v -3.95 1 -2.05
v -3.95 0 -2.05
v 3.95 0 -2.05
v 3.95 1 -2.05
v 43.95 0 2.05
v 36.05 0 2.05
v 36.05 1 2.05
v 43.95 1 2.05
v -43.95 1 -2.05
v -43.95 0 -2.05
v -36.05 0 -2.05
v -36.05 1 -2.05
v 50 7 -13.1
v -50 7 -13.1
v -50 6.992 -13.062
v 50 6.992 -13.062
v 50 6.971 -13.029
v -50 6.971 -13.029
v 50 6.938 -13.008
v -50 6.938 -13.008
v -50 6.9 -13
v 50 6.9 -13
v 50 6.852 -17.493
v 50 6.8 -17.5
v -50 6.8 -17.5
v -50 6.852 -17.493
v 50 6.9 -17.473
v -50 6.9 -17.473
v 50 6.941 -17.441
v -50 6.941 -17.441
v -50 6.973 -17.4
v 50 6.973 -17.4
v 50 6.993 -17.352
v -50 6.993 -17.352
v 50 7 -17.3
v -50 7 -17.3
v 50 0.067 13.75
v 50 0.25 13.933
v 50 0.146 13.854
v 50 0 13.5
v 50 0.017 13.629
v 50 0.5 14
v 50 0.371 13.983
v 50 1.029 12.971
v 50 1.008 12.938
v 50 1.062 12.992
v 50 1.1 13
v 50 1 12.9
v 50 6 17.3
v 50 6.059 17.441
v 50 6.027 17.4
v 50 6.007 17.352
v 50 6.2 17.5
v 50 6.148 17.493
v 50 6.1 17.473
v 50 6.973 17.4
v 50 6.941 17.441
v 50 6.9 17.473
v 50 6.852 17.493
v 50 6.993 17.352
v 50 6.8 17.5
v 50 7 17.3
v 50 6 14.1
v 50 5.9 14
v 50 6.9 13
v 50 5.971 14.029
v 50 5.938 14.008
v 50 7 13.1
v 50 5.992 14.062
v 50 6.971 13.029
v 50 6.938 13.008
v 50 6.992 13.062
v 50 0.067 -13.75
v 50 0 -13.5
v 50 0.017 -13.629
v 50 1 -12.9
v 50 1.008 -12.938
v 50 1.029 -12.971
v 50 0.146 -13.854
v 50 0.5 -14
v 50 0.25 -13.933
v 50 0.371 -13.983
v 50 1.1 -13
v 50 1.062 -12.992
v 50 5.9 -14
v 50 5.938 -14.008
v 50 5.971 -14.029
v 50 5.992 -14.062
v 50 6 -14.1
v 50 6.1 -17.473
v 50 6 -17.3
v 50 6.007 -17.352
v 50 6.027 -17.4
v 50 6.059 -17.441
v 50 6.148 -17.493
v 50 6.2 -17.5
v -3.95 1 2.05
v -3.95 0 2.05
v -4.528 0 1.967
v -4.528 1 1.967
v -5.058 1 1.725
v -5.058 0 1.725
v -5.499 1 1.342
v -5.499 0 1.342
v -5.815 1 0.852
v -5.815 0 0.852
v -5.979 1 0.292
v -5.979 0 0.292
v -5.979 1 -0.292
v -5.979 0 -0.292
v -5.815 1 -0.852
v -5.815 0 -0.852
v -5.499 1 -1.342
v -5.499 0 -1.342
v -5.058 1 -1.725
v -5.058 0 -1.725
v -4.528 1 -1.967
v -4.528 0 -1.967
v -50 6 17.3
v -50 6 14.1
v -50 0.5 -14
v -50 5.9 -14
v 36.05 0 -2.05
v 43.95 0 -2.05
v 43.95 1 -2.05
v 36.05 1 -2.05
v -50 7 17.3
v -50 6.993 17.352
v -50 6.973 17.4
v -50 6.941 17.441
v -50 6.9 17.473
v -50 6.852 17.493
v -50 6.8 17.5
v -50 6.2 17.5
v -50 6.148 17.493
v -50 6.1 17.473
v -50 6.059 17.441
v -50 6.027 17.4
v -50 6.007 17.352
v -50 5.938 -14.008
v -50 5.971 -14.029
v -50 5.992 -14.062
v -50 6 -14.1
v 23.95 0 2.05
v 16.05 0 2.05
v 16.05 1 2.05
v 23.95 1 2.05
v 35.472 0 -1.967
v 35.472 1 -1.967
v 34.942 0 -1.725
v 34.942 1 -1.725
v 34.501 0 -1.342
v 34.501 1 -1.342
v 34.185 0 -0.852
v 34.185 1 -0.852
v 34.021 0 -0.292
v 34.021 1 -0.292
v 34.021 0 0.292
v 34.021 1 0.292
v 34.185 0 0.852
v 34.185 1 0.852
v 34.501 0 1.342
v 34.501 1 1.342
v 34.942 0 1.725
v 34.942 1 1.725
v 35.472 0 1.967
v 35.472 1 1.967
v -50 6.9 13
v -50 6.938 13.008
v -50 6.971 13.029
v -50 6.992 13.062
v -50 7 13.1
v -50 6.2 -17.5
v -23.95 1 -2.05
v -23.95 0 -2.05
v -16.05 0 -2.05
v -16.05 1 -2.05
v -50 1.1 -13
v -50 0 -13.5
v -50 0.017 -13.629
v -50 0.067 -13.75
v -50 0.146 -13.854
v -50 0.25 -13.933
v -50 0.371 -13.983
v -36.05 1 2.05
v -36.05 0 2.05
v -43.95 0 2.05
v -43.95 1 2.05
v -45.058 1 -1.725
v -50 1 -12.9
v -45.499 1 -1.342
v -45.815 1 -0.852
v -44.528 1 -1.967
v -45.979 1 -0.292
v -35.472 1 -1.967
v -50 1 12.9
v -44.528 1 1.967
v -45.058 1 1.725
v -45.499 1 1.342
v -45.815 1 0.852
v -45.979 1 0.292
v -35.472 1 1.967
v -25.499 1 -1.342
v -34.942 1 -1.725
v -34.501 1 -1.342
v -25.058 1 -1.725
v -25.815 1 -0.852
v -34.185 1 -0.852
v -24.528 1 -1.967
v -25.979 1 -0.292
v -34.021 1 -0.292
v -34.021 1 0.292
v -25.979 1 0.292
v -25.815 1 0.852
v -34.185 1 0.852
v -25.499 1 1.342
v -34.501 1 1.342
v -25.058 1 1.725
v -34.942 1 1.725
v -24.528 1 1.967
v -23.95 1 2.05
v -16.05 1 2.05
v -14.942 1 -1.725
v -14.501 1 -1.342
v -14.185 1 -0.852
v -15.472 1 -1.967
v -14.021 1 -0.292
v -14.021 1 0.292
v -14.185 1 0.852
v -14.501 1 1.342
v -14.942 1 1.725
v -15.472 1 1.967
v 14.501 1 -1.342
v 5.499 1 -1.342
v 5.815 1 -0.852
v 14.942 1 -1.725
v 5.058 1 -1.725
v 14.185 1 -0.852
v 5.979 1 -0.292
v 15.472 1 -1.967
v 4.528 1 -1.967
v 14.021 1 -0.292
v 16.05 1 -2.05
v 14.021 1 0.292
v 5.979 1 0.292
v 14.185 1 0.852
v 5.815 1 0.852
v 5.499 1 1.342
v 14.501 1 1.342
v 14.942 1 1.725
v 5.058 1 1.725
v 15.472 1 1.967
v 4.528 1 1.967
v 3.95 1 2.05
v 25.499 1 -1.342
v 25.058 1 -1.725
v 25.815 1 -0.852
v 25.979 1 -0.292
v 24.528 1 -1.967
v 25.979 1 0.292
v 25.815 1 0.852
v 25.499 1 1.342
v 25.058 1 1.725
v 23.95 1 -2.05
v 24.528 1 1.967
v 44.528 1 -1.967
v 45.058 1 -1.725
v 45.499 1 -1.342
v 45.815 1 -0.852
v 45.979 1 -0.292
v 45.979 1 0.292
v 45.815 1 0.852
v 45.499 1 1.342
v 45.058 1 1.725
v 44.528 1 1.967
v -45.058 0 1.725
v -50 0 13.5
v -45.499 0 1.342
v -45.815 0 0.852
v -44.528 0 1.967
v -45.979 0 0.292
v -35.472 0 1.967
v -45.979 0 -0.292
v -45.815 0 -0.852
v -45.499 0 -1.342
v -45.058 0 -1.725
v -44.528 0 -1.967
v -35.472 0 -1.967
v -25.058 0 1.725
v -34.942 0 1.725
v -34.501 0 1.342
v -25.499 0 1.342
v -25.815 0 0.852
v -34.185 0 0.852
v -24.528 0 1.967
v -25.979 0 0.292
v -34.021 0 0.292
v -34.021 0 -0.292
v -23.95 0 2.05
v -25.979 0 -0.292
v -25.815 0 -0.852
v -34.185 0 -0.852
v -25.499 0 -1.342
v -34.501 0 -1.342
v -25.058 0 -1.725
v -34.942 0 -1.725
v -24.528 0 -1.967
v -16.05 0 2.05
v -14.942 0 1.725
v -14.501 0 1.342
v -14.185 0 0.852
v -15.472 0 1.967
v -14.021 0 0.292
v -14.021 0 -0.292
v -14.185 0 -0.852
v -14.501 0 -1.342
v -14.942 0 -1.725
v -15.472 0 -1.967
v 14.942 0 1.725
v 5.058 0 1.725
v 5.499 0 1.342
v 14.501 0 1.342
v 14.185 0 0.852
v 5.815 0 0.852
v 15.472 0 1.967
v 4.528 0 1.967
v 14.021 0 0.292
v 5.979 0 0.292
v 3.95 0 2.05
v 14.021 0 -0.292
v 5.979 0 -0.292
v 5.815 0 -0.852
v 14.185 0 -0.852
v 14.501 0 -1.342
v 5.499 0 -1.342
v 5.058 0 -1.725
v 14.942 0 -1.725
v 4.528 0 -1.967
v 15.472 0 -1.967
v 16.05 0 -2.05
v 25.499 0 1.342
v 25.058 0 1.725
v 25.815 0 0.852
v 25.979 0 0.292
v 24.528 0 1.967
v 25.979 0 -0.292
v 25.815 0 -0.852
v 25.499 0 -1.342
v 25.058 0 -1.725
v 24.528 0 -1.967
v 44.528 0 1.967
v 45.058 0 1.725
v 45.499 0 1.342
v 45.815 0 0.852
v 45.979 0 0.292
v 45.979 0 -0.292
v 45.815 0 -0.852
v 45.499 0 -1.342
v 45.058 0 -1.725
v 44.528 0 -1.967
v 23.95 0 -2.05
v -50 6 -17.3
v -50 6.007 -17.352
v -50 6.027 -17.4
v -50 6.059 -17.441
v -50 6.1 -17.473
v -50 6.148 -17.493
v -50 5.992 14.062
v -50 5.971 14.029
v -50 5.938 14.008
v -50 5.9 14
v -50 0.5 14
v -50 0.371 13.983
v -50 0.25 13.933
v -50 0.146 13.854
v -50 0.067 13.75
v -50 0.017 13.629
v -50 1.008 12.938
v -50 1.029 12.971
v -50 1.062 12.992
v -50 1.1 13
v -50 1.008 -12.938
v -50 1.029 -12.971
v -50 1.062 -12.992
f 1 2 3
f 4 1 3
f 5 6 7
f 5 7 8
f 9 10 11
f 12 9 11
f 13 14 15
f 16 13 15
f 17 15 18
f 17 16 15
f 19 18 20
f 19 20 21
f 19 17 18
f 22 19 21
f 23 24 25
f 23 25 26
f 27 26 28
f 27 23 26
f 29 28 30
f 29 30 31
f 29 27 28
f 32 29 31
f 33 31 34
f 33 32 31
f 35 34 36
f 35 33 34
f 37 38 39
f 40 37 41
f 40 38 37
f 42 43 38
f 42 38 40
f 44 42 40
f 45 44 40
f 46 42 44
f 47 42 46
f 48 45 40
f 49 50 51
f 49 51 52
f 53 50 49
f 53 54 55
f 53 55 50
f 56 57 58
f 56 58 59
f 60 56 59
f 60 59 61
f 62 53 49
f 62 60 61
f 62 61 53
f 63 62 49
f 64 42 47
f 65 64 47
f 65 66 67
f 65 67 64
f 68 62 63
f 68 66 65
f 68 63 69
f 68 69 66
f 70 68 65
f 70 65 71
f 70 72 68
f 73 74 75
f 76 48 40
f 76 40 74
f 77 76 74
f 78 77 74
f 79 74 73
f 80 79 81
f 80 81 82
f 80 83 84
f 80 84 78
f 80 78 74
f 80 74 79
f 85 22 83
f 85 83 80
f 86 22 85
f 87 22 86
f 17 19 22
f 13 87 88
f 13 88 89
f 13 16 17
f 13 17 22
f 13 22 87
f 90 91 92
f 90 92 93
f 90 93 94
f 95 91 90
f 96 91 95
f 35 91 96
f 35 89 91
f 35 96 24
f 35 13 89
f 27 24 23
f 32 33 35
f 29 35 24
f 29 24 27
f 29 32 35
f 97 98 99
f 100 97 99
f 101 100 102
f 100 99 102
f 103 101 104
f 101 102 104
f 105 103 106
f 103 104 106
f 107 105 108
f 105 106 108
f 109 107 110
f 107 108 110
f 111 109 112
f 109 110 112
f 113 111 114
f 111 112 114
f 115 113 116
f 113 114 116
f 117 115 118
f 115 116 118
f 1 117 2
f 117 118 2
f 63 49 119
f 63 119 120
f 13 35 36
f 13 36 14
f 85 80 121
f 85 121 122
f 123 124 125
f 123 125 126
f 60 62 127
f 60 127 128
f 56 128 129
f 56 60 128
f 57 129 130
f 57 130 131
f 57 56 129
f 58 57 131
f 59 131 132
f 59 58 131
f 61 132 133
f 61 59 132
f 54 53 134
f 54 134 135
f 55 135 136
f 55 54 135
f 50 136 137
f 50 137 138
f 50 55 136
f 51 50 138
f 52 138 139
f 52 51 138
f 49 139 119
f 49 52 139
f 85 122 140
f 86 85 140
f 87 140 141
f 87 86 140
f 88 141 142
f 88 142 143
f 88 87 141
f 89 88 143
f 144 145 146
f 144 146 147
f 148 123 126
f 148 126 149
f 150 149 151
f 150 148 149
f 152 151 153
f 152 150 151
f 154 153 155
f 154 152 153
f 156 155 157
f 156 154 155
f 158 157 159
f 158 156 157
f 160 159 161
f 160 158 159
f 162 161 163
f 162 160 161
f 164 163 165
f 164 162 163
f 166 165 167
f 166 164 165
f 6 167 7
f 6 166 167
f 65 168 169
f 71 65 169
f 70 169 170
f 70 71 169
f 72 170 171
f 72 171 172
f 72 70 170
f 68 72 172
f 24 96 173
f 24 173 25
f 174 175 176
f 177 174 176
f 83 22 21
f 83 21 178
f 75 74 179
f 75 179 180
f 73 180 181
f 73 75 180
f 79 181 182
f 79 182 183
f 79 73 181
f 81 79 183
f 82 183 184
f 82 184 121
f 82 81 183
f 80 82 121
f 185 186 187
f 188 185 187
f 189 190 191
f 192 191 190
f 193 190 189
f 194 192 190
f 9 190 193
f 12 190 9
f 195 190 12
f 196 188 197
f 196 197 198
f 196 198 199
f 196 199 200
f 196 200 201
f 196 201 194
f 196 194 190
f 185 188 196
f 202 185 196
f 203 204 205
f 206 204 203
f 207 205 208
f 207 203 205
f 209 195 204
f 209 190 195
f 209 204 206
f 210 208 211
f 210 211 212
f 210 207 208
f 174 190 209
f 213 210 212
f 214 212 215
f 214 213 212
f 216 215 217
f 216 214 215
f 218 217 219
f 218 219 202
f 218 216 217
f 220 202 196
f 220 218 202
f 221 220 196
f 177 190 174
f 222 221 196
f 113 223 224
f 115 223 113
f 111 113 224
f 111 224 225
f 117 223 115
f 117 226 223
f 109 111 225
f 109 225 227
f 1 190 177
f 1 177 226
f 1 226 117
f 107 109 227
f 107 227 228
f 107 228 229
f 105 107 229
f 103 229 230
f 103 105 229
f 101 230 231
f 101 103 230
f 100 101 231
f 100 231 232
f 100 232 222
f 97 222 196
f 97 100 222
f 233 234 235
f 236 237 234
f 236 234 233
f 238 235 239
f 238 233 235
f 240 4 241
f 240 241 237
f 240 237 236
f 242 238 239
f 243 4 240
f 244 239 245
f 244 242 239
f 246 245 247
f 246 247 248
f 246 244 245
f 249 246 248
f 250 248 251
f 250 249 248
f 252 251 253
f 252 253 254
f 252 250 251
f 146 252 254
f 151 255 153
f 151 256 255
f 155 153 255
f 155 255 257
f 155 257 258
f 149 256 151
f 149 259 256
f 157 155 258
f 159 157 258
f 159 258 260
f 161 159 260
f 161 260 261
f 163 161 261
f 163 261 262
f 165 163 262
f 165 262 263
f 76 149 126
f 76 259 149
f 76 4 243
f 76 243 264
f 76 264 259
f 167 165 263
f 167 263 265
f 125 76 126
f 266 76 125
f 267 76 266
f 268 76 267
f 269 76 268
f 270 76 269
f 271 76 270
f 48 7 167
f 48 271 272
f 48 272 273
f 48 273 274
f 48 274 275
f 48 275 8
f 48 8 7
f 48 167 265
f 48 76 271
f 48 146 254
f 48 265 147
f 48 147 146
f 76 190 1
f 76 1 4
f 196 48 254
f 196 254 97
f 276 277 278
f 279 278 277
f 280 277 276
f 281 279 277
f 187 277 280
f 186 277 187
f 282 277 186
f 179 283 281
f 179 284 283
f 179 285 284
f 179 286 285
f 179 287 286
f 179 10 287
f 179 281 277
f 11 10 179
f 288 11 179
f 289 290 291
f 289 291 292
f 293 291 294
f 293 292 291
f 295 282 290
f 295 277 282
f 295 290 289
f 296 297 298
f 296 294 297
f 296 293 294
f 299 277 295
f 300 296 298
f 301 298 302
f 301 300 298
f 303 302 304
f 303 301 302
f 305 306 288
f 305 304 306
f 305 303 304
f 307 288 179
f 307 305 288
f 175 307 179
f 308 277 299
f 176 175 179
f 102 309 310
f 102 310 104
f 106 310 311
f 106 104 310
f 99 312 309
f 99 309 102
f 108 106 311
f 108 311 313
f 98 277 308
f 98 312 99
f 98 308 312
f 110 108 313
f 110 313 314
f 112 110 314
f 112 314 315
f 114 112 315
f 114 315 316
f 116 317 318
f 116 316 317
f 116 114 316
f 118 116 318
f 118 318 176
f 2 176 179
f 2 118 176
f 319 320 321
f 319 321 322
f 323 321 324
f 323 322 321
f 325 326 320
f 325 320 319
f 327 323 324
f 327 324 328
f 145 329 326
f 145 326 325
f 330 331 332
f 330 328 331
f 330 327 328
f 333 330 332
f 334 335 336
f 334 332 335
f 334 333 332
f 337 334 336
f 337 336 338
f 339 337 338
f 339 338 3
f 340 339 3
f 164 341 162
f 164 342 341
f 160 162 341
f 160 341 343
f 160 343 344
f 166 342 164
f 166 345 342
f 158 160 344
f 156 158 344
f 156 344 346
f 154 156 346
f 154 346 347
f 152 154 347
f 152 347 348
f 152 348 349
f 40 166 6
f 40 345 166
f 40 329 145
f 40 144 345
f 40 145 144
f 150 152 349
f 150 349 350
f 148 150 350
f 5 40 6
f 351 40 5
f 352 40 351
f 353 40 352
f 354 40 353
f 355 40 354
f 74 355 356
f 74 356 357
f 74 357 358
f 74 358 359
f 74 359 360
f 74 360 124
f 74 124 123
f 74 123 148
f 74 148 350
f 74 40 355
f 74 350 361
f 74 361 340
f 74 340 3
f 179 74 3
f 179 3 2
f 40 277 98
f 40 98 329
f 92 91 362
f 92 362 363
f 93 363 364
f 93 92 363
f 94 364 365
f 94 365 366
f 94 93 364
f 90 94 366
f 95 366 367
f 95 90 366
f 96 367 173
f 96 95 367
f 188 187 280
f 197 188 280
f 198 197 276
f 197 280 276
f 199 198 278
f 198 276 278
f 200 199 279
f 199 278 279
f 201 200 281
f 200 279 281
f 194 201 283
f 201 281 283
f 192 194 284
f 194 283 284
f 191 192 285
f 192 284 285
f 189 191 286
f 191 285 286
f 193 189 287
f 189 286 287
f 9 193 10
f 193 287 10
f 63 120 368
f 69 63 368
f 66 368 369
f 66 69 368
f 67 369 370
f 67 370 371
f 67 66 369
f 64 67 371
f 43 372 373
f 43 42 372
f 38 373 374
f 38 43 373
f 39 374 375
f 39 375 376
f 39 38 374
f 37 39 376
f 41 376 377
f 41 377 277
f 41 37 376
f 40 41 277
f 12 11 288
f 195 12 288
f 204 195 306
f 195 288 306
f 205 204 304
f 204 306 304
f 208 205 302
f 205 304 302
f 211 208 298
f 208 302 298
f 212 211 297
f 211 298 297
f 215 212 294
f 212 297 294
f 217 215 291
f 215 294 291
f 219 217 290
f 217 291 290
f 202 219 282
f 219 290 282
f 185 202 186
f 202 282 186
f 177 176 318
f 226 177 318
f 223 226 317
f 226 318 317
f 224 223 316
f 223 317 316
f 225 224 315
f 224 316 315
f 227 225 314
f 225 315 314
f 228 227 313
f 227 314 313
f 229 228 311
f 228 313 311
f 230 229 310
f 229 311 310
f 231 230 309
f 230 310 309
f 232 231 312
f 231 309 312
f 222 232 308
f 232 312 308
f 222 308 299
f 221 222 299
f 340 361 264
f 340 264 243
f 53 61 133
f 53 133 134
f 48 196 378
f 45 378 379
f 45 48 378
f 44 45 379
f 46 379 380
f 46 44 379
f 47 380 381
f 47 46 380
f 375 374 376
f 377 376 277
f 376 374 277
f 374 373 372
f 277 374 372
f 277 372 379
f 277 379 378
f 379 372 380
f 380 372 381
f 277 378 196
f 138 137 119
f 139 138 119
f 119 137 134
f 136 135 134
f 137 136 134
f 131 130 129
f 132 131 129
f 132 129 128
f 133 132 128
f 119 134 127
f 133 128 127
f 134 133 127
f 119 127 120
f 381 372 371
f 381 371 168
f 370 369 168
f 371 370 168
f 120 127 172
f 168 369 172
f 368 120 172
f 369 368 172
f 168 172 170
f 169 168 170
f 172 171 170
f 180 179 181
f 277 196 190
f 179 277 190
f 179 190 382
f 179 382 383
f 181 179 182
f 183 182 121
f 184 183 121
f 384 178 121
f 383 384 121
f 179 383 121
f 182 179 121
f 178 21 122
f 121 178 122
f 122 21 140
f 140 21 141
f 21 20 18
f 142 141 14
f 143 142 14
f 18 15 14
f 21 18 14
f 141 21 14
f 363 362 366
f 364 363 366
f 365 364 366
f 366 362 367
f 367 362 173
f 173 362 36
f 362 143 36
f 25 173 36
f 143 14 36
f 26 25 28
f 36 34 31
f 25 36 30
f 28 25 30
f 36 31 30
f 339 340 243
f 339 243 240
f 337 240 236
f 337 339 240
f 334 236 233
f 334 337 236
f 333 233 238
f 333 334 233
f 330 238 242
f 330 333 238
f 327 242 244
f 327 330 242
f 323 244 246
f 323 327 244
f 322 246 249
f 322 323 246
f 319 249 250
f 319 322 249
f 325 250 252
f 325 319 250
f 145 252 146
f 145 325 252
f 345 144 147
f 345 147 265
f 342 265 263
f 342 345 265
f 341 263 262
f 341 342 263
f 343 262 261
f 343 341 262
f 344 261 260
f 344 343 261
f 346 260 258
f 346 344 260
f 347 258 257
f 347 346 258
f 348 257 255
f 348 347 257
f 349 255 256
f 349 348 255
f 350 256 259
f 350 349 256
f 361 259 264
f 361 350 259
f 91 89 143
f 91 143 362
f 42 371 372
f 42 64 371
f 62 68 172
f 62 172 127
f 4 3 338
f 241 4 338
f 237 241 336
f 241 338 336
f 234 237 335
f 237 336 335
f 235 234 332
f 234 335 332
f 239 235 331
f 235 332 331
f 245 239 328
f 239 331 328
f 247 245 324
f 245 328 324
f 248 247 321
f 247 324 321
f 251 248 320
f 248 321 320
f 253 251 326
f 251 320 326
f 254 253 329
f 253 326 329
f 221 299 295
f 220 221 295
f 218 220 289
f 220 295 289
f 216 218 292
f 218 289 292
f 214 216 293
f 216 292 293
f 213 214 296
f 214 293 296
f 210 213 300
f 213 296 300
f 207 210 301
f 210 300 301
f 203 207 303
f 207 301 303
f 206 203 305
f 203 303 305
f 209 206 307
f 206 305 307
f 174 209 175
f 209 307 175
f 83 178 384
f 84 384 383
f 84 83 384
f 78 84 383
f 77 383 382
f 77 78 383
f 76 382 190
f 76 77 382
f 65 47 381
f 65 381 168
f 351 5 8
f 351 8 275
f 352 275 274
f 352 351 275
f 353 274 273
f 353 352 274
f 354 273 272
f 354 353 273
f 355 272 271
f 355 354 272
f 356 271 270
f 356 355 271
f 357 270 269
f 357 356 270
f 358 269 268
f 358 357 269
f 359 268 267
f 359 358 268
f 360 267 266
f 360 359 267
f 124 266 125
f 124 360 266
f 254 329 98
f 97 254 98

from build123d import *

# Parameters (mm, degrees)
PROFILE_DEPTH       = 50
SLOT_DEPTH          = 54.434539392
SLOTLP_COUNT        = 3
SLOTLP_PITCH        = 20
SLOTHP_COPY_1_DEPTH = 54.434539392
SLOTHP_COPY_2_DEPTH = 54.434539392
SLOTHP_COPY_3_DEPTH = 54.434539392


with BuildPart() as part:
    # ProfileS → Profile (new, symmetric)
    with BuildSketch(Plane(origin=(0, 0, 0), x_dir=(0, 0, -1), z_dir=(1, 0, 0))):
        with BuildLine():
            Line((-13.5, 0), (13.5, 0))
            ThreePointArc((13.5, 0), (13.853553391, 0.146446609), (14, 0.5))
            Line((14, 0.5), (14, 5.9))
            ThreePointArc((14, 5.9), (14.029289322, 5.970710678), (14.1, 6))
            Line((14.1, 6), (17.3, 6))
            ThreePointArc((17.3, 6), (17.441421356, 6.058578644), (17.5, 6.2))
            Line((17.5, 6.2), (17.5, 6.8))
            ThreePointArc((17.5, 6.8), (17.441421356, 6.941421356), (17.3, 7))
            Line((17.3, 7), (13.1, 7))
            ThreePointArc((13.1, 7), (13.029289322, 6.970710678), (13, 6.9))
            Line((13, 6.9), (13, 1.1))
            ThreePointArc((13, 1.1), (12.970710678, 1.029289322), (12.9, 1))
            Line((12.9, 1), (-12.9, 1))
            ThreePointArc((-12.9, 1), (-12.970710678, 1.029289322), (-13, 1.1))
            Line((-13, 1.1), (-13, 6.9))
            ThreePointArc((-13, 6.9), (-13.029289322, 6.970710678), (-13.1, 7))
            Line((-13.1, 7), (-17.3, 7))
            ThreePointArc((-17.3, 7), (-17.441421356, 6.941421356), (-17.5, 6.8))
            Line((-17.5, 6.8), (-17.5, 6.2))
            ThreePointArc((-17.5, 6.2), (-17.441421356, 6.058578644), (-17.3, 6))
            Line((-17.3, 6), (-14.1, 6))
            ThreePointArc((-14.1, 6), (-14.029289322, 5.970710678), (-14, 5.9))
            Line((-14, 5.9), (-14, 0.5))
            ThreePointArc((-14, 0.5), (-13.853553391, 0.146446609), (-13.5, 0))
        make_face()
    extrude(amount=PROFILE_DEPTH, both=True)

    # SlotS → Slot (cut, through all)
    with BuildSketch(Plane(origin=(0, 0, 0), x_dir=(1, 0, 0), z_dir=(0, 1, 0))):
        with BuildLine():
            Line((-3.95, 2.05), (3.95, 2.05))
            ThreePointArc((3.95, 2.05), (6, 0), (3.95, -2.05))
            Line((3.95, -2.05), (-3.95, -2.05))
            ThreePointArc((-3.95, -2.05), (-6, 0), (-3.95, 2.05))
        make_face()
    slot = extrude(amount=SLOT_DEPTH, mode=Mode.SUBTRACT)

    # SlotLP: Slot ×3
    with Locations(*[(-i * SLOTLP_PITCH, 0, 0) for i in range(1, SLOTLP_COUNT)]):
        add(slot, mode=Mode.SUBTRACT)

    # SlotHP copy 1 sketch → SlotHP copy 1 (cut, through all)
    with BuildSketch(Plane(origin=(20, 0, 0), x_dir=(-1, 0, 0), z_dir=(0, 1, 0))):
        with BuildLine():
            Line((-3.95, -2.05), (3.95, -2.05))
            ThreePointArc((3.95, -2.05), (6, 0), (3.95, 2.05))
            Line((3.95, 2.05), (-3.95, 2.05))
            ThreePointArc((-3.95, 2.05), (-6, 0), (-3.95, -2.05))
        make_face()
    extrude(amount=SLOTHP_COPY_1_DEPTH, mode=Mode.SUBTRACT)

    # SlotHP copy 2 sketch → SlotHP copy 2 (cut, through all)
    with BuildSketch(Plane(origin=(40, 0, 0), x_dir=(-1, 0, 0), z_dir=(0, 1, 0))):
        with BuildLine():
            Line((-3.95, -2.05), (3.95, -2.05))
            ThreePointArc((3.95, -2.05), (6, 0), (3.95, 2.05))
            Line((3.95, 2.05), (-3.95, 2.05))
            ThreePointArc((-3.95, 2.05), (-6, 0), (-3.95, -2.05))
        make_face()
    extrude(amount=SLOTHP_COPY_2_DEPTH, mode=Mode.SUBTRACT)

    # SlotHP copy 3 sketch → SlotHP copy 3 (cut, through all)
    with BuildSketch(Plane(origin=(0, 0, 0), x_dir=(-1, 0, 0), z_dir=(0, 1, 0))):
        with BuildLine():
            Line((-3.95, -2.05), (3.95, -2.05))
            ThreePointArc((3.95, -2.05), (6, 0), (3.95, 2.05))
            Line((3.95, 2.05), (-3.95, 2.05))
            ThreePointArc((-3.95, 2.05), (-6, 0), (-3.95, -2.05))
        make_face()
    extrude(amount=SLOTHP_COPY_3_DEPTH, mode=Mode.SUBTRACT)


solid = part.part
